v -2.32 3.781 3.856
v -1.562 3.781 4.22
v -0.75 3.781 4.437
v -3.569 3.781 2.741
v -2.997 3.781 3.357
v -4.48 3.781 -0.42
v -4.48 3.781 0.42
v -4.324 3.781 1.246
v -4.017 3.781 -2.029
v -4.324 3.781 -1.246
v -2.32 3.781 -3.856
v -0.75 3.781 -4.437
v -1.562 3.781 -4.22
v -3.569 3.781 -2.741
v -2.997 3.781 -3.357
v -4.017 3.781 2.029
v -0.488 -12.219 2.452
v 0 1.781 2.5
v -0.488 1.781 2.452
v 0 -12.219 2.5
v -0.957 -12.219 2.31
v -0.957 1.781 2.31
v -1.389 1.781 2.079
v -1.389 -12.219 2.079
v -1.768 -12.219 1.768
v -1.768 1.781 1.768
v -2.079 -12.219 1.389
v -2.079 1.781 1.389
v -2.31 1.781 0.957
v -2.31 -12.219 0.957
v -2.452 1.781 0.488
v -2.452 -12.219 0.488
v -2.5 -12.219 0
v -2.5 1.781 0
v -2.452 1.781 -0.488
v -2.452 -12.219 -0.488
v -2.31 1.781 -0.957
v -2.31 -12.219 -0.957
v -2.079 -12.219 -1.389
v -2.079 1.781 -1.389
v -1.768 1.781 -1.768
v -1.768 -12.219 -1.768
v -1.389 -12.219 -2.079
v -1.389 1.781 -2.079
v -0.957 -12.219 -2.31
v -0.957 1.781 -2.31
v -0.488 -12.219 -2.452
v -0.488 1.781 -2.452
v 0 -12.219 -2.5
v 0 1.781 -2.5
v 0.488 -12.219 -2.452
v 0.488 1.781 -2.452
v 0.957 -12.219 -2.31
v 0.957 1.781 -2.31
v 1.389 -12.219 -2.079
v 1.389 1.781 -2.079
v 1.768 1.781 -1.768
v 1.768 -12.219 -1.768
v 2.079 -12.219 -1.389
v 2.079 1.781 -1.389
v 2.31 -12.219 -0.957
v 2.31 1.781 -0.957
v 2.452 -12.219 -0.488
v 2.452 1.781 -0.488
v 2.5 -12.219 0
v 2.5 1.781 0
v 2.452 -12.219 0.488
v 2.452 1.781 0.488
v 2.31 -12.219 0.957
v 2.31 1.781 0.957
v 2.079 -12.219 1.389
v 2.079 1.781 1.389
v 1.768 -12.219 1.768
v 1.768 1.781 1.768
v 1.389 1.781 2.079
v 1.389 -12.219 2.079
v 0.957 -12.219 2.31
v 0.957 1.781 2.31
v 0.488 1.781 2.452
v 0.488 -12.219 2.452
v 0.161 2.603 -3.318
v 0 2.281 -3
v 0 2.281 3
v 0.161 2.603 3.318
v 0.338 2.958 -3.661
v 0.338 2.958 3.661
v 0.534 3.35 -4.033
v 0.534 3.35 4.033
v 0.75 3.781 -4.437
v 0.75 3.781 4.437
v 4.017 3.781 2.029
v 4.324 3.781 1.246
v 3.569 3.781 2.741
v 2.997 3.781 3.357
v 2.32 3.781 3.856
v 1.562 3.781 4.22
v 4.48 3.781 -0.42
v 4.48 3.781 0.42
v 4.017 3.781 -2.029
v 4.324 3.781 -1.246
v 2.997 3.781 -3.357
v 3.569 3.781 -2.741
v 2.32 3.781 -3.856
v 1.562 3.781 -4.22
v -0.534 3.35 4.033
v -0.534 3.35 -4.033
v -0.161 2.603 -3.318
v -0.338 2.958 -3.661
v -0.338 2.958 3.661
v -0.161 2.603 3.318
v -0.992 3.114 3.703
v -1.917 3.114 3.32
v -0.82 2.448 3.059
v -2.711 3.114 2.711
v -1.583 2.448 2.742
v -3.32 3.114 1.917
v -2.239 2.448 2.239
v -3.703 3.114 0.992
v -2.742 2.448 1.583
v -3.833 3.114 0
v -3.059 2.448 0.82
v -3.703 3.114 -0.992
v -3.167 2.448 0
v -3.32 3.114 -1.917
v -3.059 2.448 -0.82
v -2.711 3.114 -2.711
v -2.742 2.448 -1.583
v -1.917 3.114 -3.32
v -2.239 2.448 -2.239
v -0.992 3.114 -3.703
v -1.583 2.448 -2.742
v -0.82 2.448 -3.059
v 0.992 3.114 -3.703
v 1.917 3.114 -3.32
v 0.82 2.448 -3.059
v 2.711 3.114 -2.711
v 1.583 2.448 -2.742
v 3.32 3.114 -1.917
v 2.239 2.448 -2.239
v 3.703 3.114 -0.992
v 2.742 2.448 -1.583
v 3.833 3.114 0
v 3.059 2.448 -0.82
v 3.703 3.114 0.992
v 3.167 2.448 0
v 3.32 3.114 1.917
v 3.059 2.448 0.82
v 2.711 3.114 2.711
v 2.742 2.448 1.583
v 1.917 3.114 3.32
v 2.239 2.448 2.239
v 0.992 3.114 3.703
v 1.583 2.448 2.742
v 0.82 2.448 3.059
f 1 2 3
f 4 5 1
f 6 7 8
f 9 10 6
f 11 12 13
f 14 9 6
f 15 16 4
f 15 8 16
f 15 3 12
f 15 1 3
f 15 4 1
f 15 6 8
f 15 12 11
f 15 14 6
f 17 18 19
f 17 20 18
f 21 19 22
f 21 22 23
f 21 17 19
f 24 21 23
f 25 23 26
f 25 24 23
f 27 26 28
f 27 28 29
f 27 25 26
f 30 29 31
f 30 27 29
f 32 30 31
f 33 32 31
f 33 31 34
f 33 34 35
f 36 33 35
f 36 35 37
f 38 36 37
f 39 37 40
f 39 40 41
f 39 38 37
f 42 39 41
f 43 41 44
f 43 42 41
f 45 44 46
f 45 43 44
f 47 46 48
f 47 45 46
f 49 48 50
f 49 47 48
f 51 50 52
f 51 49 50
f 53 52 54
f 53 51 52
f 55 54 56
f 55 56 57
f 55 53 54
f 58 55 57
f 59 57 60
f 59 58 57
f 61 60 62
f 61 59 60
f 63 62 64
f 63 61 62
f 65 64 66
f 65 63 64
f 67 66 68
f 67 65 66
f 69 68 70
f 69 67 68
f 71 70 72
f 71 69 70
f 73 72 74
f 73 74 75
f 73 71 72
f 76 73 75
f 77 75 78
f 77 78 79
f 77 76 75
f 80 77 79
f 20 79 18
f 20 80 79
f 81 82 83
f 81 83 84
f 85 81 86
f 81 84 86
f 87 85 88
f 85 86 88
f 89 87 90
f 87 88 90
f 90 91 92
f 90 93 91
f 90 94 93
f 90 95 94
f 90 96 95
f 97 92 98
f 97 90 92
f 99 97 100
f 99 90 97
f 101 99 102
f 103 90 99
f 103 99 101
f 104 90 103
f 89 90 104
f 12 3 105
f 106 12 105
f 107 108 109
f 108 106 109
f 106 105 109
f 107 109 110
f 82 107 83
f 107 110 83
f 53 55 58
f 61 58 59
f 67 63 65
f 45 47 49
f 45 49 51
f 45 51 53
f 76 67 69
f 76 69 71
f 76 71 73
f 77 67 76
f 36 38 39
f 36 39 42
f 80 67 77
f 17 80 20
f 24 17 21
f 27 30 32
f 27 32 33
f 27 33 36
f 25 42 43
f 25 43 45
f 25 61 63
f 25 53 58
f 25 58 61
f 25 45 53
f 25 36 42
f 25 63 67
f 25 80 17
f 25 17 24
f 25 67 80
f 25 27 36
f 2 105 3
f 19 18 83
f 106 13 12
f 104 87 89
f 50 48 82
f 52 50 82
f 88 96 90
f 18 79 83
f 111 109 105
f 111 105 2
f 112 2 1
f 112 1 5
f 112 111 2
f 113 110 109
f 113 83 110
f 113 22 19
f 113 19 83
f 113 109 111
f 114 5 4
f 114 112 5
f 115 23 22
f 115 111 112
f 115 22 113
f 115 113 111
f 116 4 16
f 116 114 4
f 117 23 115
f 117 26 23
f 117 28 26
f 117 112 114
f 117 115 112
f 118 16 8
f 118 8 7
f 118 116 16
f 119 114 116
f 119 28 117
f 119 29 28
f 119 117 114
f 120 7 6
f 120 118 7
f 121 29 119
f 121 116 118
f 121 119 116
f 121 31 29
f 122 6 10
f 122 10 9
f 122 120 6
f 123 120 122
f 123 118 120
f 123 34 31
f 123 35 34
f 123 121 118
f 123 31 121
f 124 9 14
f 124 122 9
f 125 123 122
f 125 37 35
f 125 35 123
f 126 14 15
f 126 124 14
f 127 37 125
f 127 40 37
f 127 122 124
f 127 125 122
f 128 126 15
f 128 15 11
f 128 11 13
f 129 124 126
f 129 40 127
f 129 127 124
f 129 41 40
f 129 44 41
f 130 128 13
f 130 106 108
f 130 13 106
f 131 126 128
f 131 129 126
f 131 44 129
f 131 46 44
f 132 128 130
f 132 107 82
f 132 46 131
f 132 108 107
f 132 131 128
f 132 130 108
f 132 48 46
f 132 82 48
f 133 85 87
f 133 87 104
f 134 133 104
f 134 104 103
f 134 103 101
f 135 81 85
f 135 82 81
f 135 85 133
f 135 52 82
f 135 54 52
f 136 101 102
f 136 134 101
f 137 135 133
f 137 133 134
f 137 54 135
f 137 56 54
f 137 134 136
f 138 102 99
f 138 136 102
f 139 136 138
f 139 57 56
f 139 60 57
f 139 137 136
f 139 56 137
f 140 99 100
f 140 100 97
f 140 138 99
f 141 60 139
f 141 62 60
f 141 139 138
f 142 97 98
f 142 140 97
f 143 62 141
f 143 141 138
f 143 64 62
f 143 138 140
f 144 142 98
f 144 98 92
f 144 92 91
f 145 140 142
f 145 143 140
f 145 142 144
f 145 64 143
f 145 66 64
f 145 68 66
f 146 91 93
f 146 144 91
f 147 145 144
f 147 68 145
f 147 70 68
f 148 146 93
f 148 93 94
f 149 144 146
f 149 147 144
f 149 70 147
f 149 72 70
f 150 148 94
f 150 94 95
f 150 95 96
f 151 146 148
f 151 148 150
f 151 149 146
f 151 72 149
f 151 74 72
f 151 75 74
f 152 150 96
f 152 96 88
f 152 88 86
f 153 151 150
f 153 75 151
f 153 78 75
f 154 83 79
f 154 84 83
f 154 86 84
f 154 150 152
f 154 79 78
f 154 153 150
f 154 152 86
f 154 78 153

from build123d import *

# Parameters (mm, degrees)
EXTRUDE1_DEPTH = 5


with BuildPart() as part:
    # Sketch1 → Revolve1 (revolve)
    with BuildSketch(Plane.XY, mode=Mode.PRIVATE) as revolve1_sk:
        Polygon((0, 3.780981067), (4.5, 3.780981067), (2.5, 1.780981067), (2.5, -12.219018933), (0, -12.219018933), align=None)
    revolve(revolve1_sk.sketch.rotate(Axis((0, 84.539156627, 0), (0, -1, 0)), 90), axis=Axis((0, 84.539156627, 0), (0, -1, 0)))

    # Sketch2 → Extrude1 (cut, symmetric)
    with BuildSketch(Plane.XY):
        Polygon((-0.75, 3.780981067), (0, 2.280981067), (0.75, 3.780981067), align=None)
    extrude(amount=EXTRUDE1_DEPTH, both=True, mode=Mode.SUBTRACT)


solid = part.part
